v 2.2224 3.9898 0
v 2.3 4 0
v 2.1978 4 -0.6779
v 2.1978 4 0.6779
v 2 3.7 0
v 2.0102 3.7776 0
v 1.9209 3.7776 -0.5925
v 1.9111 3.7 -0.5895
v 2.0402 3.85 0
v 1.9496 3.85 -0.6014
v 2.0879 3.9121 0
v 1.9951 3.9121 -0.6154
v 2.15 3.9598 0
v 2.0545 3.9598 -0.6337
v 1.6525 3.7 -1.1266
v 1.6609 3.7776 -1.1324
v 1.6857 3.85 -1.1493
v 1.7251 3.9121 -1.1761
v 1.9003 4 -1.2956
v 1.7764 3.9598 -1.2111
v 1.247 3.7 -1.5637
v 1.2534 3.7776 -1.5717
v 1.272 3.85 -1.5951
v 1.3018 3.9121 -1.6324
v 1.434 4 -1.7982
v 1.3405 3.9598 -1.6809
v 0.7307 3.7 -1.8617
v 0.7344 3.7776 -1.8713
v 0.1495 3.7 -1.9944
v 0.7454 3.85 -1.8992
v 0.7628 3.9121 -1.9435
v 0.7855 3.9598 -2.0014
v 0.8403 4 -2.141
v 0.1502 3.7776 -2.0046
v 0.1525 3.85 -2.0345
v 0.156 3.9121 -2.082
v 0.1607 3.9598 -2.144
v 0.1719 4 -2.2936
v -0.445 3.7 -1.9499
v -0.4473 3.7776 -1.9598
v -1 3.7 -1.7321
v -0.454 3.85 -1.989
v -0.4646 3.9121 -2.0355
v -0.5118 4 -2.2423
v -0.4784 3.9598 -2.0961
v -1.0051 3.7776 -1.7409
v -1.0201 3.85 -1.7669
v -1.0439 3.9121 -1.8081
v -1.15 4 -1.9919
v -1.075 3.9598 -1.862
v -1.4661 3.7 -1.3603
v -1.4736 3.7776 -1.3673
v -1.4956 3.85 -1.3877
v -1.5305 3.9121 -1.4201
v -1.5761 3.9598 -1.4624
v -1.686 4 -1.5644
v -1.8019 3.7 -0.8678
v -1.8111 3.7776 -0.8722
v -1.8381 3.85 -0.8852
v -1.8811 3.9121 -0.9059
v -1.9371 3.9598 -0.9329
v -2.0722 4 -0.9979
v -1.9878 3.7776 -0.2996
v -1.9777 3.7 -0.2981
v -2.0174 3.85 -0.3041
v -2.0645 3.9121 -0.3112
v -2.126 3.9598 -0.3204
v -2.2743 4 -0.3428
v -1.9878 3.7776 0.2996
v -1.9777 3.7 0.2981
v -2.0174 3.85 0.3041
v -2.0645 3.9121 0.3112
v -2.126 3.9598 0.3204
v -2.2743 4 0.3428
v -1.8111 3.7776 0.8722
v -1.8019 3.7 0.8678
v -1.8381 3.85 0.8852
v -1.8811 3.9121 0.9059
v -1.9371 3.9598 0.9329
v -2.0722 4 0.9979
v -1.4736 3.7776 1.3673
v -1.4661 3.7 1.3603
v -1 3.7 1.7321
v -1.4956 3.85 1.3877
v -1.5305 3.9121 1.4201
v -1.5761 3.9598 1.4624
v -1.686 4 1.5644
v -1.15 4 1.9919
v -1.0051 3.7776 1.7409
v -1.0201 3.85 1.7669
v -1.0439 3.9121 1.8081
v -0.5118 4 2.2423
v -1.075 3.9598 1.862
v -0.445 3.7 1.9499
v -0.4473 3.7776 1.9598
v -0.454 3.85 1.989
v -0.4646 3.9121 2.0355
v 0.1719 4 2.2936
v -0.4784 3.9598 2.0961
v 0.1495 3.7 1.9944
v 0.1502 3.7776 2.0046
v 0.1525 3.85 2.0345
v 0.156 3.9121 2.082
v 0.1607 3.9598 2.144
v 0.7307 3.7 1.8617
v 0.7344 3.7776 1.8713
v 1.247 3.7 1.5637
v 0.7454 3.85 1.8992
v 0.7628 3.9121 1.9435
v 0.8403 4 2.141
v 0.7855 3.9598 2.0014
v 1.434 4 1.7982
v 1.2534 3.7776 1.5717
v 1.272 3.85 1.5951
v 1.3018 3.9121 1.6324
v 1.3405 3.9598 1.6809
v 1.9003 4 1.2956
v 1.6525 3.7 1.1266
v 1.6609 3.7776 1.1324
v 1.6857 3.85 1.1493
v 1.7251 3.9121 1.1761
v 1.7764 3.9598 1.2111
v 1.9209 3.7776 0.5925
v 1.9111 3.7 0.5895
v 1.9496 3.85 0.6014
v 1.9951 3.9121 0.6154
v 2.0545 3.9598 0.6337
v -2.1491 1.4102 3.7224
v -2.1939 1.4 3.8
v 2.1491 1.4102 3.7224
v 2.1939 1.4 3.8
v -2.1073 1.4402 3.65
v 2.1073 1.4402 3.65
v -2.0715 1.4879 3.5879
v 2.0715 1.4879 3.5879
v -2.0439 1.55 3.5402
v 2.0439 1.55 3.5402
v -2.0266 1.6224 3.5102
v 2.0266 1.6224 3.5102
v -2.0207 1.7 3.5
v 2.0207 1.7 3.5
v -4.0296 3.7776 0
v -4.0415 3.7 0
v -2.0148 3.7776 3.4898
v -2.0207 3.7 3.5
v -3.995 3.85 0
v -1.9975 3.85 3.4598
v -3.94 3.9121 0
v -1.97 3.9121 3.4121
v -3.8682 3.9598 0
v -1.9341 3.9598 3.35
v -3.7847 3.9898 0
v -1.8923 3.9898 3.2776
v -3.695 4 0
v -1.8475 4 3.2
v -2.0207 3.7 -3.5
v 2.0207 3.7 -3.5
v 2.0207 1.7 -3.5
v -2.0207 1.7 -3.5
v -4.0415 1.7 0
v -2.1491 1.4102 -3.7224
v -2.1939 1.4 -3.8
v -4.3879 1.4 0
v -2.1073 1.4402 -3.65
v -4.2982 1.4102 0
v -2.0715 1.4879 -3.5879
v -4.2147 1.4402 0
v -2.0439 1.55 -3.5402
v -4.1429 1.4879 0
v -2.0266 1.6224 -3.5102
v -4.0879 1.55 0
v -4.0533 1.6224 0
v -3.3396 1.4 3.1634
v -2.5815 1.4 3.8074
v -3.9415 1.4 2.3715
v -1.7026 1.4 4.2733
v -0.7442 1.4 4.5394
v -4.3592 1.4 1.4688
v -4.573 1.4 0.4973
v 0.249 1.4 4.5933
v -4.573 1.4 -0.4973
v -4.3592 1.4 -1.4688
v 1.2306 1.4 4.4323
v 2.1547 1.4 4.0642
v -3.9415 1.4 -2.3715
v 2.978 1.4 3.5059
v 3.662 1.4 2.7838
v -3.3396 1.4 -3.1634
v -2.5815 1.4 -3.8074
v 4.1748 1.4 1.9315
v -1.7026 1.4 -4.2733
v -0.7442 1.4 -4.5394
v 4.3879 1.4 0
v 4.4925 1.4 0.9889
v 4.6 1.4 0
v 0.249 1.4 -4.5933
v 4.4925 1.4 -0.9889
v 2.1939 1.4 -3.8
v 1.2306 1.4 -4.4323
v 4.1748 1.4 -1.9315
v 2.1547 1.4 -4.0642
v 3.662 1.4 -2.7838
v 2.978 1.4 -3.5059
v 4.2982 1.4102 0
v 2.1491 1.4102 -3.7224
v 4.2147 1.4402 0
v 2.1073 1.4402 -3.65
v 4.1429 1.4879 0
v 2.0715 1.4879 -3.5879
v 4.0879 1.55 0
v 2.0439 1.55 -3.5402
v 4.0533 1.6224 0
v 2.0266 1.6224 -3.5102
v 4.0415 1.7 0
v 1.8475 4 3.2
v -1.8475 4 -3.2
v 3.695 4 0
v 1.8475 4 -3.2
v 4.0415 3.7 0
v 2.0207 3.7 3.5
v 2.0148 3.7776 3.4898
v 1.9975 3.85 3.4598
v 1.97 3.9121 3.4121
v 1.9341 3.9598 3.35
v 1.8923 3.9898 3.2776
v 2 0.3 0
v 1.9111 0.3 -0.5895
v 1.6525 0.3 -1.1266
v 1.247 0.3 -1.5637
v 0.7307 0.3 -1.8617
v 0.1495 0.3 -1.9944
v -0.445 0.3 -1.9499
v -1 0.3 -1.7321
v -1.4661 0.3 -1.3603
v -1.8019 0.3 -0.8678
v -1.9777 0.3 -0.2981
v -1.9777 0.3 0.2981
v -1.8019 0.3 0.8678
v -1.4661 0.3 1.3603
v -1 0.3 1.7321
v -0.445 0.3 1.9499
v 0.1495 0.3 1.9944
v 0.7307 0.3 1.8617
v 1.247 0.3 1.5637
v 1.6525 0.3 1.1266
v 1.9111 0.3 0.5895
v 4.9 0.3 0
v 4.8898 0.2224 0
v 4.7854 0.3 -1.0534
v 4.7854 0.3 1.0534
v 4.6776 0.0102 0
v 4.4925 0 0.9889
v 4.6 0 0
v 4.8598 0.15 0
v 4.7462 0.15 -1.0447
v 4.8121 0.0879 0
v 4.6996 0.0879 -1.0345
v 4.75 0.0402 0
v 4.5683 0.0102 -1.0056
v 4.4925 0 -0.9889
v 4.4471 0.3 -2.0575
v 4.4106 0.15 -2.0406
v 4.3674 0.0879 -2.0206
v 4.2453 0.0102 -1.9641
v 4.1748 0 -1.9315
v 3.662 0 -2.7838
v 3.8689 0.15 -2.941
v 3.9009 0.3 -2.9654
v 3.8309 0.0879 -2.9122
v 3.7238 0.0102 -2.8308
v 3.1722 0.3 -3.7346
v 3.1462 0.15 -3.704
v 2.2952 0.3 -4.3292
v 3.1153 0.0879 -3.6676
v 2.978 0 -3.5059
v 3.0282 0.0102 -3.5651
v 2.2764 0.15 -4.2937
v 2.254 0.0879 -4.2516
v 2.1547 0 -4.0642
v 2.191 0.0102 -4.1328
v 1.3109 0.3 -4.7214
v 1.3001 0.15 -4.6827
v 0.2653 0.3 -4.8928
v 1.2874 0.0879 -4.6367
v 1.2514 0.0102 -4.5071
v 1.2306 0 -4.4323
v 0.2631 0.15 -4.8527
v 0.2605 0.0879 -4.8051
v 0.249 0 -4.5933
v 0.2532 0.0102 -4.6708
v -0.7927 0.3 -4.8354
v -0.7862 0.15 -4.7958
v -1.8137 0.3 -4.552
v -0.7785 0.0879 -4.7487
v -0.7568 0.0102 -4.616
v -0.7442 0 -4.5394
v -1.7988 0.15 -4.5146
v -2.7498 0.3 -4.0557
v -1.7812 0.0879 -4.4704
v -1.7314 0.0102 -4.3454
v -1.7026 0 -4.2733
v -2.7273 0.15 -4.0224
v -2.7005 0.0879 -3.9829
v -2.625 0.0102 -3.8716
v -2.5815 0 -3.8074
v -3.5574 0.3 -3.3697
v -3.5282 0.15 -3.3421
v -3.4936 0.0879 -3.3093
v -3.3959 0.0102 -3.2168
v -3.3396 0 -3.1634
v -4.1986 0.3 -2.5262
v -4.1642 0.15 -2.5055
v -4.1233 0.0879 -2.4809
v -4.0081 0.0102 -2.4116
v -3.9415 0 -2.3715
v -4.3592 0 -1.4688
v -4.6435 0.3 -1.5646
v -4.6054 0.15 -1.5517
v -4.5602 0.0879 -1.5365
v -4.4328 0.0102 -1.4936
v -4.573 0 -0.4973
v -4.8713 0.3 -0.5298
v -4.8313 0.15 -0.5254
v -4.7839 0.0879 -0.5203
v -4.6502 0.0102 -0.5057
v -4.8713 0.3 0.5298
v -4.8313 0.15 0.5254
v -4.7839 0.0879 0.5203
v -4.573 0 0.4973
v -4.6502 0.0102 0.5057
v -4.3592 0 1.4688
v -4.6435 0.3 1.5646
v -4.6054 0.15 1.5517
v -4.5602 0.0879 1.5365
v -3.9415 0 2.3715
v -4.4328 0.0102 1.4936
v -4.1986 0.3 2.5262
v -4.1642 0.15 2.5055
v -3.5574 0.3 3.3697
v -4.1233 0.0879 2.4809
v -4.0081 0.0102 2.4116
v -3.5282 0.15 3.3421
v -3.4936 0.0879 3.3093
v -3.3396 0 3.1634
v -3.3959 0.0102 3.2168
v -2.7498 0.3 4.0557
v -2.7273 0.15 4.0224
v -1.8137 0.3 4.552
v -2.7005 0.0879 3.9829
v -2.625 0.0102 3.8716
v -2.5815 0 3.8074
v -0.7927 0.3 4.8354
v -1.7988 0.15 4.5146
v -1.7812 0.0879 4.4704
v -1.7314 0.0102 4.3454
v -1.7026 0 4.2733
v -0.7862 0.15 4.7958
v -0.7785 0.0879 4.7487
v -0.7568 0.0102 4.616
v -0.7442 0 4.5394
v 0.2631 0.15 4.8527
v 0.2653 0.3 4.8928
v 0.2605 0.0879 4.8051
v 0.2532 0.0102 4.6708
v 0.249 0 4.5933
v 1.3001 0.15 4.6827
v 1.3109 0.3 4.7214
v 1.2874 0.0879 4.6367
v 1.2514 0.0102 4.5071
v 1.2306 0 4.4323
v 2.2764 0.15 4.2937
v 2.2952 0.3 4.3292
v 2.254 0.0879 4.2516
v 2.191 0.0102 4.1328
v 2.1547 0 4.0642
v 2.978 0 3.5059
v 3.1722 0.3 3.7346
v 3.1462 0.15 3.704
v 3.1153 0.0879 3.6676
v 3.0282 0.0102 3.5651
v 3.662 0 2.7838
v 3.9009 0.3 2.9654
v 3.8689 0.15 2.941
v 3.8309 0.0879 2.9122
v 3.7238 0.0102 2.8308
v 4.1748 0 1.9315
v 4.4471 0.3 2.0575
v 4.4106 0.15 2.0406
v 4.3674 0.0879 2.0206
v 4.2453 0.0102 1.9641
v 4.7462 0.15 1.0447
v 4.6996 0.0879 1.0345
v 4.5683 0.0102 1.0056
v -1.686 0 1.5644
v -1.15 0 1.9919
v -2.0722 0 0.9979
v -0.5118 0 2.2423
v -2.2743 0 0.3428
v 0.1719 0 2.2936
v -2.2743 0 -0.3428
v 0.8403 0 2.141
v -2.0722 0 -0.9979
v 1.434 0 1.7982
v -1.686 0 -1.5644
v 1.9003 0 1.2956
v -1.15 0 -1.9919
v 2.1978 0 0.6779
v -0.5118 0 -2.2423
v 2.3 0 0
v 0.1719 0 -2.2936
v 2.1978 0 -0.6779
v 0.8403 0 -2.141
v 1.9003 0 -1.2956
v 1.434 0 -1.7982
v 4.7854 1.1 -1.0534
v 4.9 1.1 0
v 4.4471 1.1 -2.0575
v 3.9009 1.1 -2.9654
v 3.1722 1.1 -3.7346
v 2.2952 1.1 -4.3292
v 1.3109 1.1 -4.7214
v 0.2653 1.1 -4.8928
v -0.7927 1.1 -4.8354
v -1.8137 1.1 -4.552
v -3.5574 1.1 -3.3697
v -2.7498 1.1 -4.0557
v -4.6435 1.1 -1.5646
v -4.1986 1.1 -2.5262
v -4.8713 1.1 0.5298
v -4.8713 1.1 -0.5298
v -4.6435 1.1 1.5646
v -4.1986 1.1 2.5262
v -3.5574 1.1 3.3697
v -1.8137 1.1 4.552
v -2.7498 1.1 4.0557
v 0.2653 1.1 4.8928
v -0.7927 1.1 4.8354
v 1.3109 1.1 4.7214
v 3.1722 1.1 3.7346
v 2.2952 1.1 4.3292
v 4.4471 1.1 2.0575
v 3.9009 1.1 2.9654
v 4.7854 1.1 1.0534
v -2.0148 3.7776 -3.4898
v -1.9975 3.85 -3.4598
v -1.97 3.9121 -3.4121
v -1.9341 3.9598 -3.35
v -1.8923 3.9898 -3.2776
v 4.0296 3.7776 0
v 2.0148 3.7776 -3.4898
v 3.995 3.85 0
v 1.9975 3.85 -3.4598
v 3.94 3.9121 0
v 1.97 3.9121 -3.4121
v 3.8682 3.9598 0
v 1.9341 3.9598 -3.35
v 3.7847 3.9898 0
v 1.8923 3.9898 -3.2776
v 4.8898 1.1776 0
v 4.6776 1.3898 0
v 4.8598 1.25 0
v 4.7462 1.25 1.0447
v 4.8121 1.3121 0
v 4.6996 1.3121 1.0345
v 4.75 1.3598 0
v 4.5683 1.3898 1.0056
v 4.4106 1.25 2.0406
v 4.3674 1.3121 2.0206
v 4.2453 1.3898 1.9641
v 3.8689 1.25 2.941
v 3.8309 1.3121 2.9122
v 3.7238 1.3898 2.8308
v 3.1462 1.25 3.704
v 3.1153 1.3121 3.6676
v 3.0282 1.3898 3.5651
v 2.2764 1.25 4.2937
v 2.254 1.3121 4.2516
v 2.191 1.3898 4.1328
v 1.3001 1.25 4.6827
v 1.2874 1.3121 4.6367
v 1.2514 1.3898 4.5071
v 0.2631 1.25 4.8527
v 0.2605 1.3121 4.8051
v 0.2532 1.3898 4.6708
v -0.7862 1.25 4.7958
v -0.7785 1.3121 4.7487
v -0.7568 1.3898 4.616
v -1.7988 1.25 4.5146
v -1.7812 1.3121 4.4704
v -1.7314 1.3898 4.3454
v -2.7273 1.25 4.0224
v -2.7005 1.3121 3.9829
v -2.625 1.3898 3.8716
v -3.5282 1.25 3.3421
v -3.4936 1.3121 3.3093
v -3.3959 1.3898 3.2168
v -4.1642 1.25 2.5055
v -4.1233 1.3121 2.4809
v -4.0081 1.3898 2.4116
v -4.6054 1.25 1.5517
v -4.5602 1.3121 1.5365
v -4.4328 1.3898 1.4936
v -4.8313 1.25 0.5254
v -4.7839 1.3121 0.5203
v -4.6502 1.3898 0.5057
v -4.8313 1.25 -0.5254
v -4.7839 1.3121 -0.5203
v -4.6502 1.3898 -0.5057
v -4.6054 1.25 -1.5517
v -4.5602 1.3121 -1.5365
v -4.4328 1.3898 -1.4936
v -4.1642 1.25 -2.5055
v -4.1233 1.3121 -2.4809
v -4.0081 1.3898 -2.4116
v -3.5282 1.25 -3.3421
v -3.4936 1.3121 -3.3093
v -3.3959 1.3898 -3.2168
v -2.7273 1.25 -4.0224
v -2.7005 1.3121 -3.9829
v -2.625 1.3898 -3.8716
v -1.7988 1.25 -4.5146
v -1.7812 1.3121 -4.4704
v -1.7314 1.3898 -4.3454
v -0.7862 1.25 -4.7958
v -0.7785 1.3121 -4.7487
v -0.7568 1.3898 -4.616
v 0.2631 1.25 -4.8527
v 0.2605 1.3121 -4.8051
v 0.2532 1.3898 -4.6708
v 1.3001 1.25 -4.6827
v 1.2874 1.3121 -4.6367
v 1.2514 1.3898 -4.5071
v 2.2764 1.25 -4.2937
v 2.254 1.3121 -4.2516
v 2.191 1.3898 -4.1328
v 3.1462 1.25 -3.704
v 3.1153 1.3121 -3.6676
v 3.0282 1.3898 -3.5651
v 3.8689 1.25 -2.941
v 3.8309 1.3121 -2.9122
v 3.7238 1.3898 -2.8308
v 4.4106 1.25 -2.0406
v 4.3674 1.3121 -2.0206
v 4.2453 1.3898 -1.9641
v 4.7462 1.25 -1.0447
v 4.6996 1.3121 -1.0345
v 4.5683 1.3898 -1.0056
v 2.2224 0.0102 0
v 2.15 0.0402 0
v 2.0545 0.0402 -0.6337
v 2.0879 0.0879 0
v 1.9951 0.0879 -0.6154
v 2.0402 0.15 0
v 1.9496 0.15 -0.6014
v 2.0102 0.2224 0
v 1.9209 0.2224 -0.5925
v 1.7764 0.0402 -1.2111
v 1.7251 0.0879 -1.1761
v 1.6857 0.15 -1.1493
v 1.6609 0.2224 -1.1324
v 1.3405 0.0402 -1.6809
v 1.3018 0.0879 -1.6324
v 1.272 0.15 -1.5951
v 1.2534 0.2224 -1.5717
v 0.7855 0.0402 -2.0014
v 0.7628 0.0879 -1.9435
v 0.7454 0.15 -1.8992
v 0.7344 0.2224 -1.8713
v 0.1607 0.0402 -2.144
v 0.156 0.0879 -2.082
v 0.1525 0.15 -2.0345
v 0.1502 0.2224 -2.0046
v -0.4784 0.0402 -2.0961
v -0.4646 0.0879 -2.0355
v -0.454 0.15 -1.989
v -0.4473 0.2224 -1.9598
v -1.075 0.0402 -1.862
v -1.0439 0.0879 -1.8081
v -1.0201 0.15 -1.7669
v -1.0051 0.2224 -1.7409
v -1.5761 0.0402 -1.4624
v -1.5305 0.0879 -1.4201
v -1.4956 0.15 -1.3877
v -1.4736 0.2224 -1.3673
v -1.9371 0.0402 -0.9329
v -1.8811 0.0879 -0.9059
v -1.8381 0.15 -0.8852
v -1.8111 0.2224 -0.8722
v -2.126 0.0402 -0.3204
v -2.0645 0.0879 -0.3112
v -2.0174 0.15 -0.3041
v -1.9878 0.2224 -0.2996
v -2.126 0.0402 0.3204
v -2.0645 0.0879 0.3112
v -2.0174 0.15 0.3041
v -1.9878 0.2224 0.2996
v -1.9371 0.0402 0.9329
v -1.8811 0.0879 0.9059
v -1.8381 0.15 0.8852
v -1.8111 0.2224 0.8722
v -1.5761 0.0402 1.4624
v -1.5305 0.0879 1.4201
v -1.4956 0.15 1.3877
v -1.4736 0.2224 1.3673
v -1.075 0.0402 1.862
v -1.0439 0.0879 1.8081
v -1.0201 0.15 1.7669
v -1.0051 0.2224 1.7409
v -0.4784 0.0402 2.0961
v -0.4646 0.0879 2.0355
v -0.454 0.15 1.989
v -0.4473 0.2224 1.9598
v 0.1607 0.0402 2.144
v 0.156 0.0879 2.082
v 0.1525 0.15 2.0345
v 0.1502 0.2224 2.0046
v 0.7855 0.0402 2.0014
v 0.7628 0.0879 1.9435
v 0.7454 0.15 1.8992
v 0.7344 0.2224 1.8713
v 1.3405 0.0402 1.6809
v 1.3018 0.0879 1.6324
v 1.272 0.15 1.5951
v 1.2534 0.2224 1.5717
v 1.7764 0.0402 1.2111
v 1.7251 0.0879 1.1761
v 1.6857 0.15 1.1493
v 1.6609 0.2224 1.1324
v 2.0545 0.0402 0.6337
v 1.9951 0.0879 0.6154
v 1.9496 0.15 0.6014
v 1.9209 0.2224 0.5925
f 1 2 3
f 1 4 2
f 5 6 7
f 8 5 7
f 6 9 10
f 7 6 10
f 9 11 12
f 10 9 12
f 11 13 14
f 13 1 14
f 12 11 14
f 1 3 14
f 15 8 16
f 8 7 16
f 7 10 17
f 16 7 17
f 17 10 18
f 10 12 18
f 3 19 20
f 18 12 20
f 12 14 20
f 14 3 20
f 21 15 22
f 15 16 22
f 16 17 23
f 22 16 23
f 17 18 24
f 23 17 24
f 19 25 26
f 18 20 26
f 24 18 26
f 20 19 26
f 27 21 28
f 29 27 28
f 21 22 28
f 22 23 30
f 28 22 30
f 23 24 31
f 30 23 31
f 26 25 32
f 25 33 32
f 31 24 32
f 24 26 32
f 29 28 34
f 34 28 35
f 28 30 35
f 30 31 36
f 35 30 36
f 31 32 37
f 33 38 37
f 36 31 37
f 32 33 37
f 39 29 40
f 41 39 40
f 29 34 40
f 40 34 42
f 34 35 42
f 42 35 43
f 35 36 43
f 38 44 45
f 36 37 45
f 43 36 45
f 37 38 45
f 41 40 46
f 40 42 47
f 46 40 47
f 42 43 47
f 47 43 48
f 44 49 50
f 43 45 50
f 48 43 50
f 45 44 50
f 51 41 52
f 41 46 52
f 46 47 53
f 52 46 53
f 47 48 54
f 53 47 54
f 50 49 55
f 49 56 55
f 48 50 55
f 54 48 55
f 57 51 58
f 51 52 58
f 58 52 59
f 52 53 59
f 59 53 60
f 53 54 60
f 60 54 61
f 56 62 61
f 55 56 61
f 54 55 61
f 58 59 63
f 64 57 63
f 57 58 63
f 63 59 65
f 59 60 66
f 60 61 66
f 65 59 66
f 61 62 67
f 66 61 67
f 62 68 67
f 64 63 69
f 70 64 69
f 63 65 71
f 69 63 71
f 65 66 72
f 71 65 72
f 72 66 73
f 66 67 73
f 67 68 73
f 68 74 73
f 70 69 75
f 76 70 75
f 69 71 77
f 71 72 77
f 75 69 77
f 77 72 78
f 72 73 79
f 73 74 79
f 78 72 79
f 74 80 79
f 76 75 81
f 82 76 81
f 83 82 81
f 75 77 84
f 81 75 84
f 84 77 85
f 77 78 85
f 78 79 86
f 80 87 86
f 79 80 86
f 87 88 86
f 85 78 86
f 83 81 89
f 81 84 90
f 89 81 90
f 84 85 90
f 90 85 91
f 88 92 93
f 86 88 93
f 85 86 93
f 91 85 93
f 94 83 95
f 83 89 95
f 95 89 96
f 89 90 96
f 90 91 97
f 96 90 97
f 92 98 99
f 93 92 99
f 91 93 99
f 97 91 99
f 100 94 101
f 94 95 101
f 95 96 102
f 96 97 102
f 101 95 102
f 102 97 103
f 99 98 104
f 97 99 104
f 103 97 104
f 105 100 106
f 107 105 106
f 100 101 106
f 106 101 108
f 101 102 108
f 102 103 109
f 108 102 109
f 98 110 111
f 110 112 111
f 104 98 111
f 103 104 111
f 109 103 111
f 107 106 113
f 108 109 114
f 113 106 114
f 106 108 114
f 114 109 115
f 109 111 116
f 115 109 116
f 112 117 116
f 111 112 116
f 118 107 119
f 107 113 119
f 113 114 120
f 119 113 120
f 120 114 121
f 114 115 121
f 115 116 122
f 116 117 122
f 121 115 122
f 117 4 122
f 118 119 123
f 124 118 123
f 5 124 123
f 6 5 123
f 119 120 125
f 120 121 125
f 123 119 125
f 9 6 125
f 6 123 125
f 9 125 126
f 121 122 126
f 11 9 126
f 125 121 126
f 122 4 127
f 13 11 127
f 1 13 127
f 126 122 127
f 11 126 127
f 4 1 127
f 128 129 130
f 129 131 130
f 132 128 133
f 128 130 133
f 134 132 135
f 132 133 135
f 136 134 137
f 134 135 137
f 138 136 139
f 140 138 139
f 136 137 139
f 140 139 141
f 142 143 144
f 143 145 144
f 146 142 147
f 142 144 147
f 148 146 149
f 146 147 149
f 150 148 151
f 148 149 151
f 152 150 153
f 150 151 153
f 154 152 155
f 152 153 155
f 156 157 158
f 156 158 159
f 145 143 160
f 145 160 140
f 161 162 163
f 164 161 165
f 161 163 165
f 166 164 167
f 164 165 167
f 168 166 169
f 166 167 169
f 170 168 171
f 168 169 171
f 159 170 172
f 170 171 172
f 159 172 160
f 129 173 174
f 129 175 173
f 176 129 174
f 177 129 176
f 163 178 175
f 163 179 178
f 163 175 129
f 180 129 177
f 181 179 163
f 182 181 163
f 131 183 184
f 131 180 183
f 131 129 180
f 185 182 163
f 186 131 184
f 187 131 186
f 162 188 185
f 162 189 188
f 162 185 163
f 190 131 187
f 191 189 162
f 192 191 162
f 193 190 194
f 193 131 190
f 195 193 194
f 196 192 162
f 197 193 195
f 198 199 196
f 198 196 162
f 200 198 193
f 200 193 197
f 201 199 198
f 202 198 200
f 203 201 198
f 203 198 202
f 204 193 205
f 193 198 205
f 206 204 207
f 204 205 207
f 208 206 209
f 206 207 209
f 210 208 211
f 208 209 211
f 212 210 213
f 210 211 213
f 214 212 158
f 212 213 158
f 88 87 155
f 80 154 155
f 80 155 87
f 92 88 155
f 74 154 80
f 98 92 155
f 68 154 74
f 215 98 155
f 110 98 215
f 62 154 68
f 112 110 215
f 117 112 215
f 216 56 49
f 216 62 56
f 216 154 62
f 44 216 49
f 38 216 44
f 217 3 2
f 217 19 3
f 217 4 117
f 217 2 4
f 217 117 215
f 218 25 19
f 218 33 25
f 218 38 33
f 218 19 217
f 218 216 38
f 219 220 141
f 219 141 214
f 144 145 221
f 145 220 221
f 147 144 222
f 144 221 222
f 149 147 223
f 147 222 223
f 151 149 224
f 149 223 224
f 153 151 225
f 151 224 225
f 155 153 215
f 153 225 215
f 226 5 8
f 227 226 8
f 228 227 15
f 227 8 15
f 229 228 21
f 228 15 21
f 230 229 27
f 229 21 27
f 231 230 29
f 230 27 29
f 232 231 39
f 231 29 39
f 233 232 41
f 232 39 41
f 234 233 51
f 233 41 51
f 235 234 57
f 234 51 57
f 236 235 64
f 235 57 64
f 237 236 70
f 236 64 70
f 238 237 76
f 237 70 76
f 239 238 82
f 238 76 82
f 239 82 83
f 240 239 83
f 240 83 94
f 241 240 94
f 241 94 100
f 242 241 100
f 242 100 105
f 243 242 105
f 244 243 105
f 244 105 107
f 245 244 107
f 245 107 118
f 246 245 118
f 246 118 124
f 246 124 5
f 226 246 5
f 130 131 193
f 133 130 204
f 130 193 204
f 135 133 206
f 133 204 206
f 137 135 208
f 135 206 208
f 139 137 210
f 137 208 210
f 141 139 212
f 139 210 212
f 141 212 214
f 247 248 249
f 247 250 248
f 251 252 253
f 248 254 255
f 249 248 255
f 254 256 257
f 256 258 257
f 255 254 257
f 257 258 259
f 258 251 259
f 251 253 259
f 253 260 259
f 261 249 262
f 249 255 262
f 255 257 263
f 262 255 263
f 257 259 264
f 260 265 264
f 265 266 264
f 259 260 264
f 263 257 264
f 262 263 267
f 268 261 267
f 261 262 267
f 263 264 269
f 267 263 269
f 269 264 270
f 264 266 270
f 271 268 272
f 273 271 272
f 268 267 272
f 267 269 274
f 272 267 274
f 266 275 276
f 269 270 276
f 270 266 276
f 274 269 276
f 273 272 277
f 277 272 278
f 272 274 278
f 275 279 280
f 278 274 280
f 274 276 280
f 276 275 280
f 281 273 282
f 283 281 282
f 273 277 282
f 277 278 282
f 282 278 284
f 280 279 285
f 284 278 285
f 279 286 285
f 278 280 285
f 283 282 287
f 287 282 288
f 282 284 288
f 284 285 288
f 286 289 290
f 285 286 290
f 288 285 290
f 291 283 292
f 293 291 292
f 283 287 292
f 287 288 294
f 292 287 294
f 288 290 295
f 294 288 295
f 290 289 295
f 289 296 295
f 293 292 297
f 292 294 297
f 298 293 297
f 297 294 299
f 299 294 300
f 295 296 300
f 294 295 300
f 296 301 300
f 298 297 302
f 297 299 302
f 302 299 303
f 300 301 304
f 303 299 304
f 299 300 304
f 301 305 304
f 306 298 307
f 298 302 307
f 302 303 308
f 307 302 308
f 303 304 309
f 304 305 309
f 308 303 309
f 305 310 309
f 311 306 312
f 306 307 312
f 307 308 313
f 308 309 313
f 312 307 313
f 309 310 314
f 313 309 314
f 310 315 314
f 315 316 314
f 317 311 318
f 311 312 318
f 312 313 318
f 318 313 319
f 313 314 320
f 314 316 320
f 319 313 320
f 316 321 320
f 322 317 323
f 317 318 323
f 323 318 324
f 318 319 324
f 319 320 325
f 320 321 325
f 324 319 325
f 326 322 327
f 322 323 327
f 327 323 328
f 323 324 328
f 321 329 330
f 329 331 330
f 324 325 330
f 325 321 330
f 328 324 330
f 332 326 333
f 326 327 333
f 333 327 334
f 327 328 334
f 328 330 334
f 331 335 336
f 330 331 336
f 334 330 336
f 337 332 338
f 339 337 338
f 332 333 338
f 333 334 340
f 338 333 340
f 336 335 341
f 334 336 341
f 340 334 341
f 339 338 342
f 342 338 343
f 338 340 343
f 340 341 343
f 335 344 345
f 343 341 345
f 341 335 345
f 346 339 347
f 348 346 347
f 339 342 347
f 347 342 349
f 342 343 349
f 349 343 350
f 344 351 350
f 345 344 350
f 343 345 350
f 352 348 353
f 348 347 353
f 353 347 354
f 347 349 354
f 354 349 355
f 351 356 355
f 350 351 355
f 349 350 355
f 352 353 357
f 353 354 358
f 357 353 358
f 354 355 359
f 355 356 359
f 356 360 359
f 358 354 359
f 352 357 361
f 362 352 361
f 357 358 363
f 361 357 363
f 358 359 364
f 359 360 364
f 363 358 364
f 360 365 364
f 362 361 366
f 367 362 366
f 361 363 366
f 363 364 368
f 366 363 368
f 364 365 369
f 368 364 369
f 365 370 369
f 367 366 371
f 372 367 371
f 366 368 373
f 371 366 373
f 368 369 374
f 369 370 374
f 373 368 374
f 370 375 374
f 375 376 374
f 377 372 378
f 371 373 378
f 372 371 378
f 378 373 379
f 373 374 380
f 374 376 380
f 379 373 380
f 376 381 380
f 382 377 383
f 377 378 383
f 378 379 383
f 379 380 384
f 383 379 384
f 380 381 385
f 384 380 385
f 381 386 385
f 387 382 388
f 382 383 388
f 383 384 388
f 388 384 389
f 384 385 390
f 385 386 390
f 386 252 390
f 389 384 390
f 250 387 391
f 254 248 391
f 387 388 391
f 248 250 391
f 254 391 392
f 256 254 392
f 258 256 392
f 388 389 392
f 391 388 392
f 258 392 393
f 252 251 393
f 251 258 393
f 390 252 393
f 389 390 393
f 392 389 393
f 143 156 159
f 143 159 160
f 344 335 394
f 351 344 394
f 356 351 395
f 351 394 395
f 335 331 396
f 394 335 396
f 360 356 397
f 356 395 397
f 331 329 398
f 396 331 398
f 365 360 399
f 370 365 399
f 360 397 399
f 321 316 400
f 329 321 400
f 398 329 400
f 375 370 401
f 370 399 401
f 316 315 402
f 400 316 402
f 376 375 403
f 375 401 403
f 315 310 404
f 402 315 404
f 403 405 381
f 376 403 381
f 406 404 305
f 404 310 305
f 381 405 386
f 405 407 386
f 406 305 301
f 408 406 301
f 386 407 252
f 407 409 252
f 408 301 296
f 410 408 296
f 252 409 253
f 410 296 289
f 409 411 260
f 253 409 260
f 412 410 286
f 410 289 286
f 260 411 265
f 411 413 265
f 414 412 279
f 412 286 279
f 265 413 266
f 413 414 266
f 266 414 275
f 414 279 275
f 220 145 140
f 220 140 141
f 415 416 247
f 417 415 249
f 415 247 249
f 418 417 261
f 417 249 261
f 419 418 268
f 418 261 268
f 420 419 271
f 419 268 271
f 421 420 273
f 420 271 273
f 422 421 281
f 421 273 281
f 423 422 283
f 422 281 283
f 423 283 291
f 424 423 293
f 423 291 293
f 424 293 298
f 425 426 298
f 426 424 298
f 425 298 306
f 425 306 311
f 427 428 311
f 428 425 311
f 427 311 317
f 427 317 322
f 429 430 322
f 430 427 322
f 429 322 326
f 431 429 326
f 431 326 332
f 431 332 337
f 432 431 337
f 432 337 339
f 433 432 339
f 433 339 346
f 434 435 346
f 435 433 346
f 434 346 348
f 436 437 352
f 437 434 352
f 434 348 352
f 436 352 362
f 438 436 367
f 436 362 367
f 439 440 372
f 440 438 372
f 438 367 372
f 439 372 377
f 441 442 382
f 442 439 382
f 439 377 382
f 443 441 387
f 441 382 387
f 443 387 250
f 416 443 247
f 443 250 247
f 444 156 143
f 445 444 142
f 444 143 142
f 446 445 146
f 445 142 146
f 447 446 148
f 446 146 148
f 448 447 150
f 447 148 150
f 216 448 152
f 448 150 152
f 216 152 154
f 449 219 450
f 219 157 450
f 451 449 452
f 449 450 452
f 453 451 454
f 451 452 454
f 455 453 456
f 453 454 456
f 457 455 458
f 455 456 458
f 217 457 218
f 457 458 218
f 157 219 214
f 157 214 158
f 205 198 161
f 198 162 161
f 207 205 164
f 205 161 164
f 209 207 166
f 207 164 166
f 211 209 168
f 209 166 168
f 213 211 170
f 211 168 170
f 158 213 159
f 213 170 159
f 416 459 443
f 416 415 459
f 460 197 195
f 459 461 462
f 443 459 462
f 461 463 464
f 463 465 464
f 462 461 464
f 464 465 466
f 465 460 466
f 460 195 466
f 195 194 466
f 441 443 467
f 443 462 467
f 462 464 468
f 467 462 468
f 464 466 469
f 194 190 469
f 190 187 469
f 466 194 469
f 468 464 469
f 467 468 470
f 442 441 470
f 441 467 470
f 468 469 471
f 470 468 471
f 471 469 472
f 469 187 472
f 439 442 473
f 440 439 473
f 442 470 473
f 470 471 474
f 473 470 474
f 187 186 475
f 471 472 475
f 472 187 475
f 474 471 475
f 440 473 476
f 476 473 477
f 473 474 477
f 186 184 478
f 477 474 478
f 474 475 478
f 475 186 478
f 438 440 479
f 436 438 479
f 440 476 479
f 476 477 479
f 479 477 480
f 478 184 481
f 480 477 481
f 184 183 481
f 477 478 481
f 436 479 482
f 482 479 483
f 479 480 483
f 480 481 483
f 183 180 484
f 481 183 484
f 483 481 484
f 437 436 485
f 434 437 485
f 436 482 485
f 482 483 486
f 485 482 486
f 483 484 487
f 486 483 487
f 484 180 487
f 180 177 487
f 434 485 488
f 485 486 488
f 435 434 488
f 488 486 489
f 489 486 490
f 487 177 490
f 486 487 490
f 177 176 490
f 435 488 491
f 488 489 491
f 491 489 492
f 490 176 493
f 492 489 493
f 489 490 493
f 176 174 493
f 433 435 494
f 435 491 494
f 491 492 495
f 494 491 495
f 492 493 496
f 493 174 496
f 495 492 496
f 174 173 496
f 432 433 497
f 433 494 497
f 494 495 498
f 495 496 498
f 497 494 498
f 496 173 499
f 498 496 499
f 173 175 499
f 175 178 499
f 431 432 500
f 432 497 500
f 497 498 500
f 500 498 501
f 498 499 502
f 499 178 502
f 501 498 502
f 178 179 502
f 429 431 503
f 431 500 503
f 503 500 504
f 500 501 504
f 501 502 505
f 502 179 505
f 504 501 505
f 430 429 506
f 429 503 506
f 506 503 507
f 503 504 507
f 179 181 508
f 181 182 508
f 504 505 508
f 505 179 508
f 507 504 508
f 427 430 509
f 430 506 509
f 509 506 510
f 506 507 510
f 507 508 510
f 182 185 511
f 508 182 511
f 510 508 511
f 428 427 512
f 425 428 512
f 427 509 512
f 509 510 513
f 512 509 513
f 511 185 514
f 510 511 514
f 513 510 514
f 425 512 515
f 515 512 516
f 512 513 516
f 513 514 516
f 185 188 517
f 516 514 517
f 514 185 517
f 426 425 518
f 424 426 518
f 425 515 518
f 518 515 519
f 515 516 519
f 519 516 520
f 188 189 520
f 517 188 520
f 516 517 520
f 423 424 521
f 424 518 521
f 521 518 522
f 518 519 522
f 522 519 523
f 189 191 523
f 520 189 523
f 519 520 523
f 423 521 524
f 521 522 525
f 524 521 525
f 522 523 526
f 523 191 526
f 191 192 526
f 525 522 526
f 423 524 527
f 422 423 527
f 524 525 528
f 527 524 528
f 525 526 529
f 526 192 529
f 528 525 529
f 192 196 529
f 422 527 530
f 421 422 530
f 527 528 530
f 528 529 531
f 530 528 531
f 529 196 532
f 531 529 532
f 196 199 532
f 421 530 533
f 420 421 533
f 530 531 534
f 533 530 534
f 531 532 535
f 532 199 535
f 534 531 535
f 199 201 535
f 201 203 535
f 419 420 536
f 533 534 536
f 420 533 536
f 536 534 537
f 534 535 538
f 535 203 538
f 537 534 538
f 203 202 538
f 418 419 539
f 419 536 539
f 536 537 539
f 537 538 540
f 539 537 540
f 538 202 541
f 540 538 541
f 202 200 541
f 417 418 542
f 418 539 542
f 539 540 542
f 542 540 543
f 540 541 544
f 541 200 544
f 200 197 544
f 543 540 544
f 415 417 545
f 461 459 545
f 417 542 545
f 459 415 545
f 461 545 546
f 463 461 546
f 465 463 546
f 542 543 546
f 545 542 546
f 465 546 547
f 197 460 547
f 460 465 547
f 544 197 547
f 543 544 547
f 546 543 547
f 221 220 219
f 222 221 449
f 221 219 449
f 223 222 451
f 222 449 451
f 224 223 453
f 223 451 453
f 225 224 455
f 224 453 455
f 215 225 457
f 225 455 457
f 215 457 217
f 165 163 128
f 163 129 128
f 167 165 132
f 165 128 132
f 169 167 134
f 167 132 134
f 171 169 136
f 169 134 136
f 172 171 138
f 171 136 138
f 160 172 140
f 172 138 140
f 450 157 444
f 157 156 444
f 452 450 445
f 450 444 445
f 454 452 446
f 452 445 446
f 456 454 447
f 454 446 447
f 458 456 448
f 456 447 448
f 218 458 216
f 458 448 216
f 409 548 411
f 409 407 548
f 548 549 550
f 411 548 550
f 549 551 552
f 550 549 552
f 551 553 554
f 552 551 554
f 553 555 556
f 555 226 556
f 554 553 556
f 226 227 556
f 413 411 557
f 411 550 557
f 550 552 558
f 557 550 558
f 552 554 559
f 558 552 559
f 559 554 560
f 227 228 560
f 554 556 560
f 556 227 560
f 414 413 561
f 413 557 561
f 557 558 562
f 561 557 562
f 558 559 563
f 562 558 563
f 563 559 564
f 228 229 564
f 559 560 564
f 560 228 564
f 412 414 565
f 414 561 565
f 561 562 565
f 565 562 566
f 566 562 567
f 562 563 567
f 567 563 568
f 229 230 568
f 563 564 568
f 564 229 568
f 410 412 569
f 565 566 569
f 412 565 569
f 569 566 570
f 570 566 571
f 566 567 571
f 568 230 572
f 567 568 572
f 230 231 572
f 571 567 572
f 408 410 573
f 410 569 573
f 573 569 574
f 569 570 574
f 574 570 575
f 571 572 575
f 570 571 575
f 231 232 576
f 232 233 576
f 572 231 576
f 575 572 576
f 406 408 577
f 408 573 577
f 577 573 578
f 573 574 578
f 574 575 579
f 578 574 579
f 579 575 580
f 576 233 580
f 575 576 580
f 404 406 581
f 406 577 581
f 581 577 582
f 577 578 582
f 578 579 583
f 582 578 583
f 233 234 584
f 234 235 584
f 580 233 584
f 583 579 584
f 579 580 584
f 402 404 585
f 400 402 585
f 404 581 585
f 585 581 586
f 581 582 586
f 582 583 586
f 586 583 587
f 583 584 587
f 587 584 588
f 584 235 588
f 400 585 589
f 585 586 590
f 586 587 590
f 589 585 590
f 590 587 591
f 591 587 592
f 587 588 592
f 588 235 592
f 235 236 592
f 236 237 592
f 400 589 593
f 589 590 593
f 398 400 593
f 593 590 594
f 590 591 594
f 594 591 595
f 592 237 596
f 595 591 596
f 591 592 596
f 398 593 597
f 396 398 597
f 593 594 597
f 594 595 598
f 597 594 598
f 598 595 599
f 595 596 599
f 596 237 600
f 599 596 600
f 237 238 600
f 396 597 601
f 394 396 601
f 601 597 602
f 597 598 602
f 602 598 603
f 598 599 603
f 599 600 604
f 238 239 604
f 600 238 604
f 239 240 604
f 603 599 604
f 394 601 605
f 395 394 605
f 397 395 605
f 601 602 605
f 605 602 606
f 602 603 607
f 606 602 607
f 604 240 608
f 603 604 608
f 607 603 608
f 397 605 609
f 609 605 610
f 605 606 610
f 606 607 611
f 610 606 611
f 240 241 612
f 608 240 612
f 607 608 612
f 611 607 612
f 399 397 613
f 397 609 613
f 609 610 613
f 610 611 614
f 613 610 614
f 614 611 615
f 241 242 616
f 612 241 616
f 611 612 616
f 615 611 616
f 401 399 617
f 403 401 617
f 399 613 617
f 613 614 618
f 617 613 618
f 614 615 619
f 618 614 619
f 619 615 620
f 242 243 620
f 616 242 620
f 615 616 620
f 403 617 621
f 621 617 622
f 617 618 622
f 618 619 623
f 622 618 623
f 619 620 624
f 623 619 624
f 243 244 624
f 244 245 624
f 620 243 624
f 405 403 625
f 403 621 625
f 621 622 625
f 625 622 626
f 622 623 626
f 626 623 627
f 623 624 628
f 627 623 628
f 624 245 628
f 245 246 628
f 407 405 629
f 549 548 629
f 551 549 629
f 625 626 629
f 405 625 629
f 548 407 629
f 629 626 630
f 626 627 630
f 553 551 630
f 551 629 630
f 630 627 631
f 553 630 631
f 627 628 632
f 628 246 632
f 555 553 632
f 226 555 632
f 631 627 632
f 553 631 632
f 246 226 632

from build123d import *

# Parameters (mm, degrees)
SKETCH1_R           = 4.9
BOSS_EXTRUDE1_DEPTH = 4
SKETCH2_R           = 2
CUT_EXTRUDE1_DEPTH  = 4.8
SKETCH3_OUTSIDE_W   = 14.684
SKETCH3_OUTSIDE_H   = 14.684
CUT_EXTRUDE2_DEPTH  = 2.6
FILLET1_R           = 0.3


with BuildPart() as part:
    # Sketch1 → Boss-Extrude1 (new body)
    with BuildSketch(Plane(origin=(0, 0, 0), x_dir=(1, 0, 0), z_dir=(0, 1, 0))):
        Circle(SKETCH1_R)
    extrude(amount=BOSS_EXTRUDE1_DEPTH)

    # Sketch2 → Cut-Extrude1 (cut)
    with BuildSketch(Plane(origin=(0, 4, 0), x_dir=(1, 0, 0), z_dir=(0, 1, 0))):
        Circle(SKETCH2_R)
    extrude(amount=-CUT_EXTRUDE1_DEPTH, mode=Mode.SUBTRACT)

    # Sketch3 outside → Cut-Extrude2 (cut)
    with BuildSketch(Plane(origin=(0, 4, 0), x_dir=(1, 0, 0), z_dir=(0, 1, 0))):
        Rectangle(SKETCH3_OUTSIDE_W, SKETCH3_OUTSIDE_H)
        Polygon((4.041451884, 0), (2.020725942, 3.5), (-2.020725942, 3.5), (-4.041451884, 0), (-2.020725942, -3.5), (2.020725942, -3.5), align=None, mode=Mode.SUBTRACT)
    extrude(amount=-CUT_EXTRUDE2_DEPTH, mode=Mode.SUBTRACT)

    # Fillet1
    fillet1_edges = [part.edges().sort_by_distance(p)[0] for p in [
        (0, 1.4, 3.5),
        (3.031088913, 1.4, 1.75),
        (3.031088913, 1.4, -1.75),
        (0, 1.4, -3.5),
        (-3.031088913, 1.4, -1.75),
        (-3.031088913, 1.4, 1.75),
        (-4.9, 1.4, 0),
        (-4.9, 0, 0),
        (3.031088913, 4, 1.75),
        (0, 4, 3.5),
        (-3.031088913, 4, 1.75),
        (-3.031088913, 4, -1.75),
        (0, 4, -3.5),
        (3.031088913, 4, -1.75),
        (-2, 0, 0),
        (-2, 4, 0),
    ]]
    fillet(fillet1_edges, radius=FILLET1_R)


solid = part.part
